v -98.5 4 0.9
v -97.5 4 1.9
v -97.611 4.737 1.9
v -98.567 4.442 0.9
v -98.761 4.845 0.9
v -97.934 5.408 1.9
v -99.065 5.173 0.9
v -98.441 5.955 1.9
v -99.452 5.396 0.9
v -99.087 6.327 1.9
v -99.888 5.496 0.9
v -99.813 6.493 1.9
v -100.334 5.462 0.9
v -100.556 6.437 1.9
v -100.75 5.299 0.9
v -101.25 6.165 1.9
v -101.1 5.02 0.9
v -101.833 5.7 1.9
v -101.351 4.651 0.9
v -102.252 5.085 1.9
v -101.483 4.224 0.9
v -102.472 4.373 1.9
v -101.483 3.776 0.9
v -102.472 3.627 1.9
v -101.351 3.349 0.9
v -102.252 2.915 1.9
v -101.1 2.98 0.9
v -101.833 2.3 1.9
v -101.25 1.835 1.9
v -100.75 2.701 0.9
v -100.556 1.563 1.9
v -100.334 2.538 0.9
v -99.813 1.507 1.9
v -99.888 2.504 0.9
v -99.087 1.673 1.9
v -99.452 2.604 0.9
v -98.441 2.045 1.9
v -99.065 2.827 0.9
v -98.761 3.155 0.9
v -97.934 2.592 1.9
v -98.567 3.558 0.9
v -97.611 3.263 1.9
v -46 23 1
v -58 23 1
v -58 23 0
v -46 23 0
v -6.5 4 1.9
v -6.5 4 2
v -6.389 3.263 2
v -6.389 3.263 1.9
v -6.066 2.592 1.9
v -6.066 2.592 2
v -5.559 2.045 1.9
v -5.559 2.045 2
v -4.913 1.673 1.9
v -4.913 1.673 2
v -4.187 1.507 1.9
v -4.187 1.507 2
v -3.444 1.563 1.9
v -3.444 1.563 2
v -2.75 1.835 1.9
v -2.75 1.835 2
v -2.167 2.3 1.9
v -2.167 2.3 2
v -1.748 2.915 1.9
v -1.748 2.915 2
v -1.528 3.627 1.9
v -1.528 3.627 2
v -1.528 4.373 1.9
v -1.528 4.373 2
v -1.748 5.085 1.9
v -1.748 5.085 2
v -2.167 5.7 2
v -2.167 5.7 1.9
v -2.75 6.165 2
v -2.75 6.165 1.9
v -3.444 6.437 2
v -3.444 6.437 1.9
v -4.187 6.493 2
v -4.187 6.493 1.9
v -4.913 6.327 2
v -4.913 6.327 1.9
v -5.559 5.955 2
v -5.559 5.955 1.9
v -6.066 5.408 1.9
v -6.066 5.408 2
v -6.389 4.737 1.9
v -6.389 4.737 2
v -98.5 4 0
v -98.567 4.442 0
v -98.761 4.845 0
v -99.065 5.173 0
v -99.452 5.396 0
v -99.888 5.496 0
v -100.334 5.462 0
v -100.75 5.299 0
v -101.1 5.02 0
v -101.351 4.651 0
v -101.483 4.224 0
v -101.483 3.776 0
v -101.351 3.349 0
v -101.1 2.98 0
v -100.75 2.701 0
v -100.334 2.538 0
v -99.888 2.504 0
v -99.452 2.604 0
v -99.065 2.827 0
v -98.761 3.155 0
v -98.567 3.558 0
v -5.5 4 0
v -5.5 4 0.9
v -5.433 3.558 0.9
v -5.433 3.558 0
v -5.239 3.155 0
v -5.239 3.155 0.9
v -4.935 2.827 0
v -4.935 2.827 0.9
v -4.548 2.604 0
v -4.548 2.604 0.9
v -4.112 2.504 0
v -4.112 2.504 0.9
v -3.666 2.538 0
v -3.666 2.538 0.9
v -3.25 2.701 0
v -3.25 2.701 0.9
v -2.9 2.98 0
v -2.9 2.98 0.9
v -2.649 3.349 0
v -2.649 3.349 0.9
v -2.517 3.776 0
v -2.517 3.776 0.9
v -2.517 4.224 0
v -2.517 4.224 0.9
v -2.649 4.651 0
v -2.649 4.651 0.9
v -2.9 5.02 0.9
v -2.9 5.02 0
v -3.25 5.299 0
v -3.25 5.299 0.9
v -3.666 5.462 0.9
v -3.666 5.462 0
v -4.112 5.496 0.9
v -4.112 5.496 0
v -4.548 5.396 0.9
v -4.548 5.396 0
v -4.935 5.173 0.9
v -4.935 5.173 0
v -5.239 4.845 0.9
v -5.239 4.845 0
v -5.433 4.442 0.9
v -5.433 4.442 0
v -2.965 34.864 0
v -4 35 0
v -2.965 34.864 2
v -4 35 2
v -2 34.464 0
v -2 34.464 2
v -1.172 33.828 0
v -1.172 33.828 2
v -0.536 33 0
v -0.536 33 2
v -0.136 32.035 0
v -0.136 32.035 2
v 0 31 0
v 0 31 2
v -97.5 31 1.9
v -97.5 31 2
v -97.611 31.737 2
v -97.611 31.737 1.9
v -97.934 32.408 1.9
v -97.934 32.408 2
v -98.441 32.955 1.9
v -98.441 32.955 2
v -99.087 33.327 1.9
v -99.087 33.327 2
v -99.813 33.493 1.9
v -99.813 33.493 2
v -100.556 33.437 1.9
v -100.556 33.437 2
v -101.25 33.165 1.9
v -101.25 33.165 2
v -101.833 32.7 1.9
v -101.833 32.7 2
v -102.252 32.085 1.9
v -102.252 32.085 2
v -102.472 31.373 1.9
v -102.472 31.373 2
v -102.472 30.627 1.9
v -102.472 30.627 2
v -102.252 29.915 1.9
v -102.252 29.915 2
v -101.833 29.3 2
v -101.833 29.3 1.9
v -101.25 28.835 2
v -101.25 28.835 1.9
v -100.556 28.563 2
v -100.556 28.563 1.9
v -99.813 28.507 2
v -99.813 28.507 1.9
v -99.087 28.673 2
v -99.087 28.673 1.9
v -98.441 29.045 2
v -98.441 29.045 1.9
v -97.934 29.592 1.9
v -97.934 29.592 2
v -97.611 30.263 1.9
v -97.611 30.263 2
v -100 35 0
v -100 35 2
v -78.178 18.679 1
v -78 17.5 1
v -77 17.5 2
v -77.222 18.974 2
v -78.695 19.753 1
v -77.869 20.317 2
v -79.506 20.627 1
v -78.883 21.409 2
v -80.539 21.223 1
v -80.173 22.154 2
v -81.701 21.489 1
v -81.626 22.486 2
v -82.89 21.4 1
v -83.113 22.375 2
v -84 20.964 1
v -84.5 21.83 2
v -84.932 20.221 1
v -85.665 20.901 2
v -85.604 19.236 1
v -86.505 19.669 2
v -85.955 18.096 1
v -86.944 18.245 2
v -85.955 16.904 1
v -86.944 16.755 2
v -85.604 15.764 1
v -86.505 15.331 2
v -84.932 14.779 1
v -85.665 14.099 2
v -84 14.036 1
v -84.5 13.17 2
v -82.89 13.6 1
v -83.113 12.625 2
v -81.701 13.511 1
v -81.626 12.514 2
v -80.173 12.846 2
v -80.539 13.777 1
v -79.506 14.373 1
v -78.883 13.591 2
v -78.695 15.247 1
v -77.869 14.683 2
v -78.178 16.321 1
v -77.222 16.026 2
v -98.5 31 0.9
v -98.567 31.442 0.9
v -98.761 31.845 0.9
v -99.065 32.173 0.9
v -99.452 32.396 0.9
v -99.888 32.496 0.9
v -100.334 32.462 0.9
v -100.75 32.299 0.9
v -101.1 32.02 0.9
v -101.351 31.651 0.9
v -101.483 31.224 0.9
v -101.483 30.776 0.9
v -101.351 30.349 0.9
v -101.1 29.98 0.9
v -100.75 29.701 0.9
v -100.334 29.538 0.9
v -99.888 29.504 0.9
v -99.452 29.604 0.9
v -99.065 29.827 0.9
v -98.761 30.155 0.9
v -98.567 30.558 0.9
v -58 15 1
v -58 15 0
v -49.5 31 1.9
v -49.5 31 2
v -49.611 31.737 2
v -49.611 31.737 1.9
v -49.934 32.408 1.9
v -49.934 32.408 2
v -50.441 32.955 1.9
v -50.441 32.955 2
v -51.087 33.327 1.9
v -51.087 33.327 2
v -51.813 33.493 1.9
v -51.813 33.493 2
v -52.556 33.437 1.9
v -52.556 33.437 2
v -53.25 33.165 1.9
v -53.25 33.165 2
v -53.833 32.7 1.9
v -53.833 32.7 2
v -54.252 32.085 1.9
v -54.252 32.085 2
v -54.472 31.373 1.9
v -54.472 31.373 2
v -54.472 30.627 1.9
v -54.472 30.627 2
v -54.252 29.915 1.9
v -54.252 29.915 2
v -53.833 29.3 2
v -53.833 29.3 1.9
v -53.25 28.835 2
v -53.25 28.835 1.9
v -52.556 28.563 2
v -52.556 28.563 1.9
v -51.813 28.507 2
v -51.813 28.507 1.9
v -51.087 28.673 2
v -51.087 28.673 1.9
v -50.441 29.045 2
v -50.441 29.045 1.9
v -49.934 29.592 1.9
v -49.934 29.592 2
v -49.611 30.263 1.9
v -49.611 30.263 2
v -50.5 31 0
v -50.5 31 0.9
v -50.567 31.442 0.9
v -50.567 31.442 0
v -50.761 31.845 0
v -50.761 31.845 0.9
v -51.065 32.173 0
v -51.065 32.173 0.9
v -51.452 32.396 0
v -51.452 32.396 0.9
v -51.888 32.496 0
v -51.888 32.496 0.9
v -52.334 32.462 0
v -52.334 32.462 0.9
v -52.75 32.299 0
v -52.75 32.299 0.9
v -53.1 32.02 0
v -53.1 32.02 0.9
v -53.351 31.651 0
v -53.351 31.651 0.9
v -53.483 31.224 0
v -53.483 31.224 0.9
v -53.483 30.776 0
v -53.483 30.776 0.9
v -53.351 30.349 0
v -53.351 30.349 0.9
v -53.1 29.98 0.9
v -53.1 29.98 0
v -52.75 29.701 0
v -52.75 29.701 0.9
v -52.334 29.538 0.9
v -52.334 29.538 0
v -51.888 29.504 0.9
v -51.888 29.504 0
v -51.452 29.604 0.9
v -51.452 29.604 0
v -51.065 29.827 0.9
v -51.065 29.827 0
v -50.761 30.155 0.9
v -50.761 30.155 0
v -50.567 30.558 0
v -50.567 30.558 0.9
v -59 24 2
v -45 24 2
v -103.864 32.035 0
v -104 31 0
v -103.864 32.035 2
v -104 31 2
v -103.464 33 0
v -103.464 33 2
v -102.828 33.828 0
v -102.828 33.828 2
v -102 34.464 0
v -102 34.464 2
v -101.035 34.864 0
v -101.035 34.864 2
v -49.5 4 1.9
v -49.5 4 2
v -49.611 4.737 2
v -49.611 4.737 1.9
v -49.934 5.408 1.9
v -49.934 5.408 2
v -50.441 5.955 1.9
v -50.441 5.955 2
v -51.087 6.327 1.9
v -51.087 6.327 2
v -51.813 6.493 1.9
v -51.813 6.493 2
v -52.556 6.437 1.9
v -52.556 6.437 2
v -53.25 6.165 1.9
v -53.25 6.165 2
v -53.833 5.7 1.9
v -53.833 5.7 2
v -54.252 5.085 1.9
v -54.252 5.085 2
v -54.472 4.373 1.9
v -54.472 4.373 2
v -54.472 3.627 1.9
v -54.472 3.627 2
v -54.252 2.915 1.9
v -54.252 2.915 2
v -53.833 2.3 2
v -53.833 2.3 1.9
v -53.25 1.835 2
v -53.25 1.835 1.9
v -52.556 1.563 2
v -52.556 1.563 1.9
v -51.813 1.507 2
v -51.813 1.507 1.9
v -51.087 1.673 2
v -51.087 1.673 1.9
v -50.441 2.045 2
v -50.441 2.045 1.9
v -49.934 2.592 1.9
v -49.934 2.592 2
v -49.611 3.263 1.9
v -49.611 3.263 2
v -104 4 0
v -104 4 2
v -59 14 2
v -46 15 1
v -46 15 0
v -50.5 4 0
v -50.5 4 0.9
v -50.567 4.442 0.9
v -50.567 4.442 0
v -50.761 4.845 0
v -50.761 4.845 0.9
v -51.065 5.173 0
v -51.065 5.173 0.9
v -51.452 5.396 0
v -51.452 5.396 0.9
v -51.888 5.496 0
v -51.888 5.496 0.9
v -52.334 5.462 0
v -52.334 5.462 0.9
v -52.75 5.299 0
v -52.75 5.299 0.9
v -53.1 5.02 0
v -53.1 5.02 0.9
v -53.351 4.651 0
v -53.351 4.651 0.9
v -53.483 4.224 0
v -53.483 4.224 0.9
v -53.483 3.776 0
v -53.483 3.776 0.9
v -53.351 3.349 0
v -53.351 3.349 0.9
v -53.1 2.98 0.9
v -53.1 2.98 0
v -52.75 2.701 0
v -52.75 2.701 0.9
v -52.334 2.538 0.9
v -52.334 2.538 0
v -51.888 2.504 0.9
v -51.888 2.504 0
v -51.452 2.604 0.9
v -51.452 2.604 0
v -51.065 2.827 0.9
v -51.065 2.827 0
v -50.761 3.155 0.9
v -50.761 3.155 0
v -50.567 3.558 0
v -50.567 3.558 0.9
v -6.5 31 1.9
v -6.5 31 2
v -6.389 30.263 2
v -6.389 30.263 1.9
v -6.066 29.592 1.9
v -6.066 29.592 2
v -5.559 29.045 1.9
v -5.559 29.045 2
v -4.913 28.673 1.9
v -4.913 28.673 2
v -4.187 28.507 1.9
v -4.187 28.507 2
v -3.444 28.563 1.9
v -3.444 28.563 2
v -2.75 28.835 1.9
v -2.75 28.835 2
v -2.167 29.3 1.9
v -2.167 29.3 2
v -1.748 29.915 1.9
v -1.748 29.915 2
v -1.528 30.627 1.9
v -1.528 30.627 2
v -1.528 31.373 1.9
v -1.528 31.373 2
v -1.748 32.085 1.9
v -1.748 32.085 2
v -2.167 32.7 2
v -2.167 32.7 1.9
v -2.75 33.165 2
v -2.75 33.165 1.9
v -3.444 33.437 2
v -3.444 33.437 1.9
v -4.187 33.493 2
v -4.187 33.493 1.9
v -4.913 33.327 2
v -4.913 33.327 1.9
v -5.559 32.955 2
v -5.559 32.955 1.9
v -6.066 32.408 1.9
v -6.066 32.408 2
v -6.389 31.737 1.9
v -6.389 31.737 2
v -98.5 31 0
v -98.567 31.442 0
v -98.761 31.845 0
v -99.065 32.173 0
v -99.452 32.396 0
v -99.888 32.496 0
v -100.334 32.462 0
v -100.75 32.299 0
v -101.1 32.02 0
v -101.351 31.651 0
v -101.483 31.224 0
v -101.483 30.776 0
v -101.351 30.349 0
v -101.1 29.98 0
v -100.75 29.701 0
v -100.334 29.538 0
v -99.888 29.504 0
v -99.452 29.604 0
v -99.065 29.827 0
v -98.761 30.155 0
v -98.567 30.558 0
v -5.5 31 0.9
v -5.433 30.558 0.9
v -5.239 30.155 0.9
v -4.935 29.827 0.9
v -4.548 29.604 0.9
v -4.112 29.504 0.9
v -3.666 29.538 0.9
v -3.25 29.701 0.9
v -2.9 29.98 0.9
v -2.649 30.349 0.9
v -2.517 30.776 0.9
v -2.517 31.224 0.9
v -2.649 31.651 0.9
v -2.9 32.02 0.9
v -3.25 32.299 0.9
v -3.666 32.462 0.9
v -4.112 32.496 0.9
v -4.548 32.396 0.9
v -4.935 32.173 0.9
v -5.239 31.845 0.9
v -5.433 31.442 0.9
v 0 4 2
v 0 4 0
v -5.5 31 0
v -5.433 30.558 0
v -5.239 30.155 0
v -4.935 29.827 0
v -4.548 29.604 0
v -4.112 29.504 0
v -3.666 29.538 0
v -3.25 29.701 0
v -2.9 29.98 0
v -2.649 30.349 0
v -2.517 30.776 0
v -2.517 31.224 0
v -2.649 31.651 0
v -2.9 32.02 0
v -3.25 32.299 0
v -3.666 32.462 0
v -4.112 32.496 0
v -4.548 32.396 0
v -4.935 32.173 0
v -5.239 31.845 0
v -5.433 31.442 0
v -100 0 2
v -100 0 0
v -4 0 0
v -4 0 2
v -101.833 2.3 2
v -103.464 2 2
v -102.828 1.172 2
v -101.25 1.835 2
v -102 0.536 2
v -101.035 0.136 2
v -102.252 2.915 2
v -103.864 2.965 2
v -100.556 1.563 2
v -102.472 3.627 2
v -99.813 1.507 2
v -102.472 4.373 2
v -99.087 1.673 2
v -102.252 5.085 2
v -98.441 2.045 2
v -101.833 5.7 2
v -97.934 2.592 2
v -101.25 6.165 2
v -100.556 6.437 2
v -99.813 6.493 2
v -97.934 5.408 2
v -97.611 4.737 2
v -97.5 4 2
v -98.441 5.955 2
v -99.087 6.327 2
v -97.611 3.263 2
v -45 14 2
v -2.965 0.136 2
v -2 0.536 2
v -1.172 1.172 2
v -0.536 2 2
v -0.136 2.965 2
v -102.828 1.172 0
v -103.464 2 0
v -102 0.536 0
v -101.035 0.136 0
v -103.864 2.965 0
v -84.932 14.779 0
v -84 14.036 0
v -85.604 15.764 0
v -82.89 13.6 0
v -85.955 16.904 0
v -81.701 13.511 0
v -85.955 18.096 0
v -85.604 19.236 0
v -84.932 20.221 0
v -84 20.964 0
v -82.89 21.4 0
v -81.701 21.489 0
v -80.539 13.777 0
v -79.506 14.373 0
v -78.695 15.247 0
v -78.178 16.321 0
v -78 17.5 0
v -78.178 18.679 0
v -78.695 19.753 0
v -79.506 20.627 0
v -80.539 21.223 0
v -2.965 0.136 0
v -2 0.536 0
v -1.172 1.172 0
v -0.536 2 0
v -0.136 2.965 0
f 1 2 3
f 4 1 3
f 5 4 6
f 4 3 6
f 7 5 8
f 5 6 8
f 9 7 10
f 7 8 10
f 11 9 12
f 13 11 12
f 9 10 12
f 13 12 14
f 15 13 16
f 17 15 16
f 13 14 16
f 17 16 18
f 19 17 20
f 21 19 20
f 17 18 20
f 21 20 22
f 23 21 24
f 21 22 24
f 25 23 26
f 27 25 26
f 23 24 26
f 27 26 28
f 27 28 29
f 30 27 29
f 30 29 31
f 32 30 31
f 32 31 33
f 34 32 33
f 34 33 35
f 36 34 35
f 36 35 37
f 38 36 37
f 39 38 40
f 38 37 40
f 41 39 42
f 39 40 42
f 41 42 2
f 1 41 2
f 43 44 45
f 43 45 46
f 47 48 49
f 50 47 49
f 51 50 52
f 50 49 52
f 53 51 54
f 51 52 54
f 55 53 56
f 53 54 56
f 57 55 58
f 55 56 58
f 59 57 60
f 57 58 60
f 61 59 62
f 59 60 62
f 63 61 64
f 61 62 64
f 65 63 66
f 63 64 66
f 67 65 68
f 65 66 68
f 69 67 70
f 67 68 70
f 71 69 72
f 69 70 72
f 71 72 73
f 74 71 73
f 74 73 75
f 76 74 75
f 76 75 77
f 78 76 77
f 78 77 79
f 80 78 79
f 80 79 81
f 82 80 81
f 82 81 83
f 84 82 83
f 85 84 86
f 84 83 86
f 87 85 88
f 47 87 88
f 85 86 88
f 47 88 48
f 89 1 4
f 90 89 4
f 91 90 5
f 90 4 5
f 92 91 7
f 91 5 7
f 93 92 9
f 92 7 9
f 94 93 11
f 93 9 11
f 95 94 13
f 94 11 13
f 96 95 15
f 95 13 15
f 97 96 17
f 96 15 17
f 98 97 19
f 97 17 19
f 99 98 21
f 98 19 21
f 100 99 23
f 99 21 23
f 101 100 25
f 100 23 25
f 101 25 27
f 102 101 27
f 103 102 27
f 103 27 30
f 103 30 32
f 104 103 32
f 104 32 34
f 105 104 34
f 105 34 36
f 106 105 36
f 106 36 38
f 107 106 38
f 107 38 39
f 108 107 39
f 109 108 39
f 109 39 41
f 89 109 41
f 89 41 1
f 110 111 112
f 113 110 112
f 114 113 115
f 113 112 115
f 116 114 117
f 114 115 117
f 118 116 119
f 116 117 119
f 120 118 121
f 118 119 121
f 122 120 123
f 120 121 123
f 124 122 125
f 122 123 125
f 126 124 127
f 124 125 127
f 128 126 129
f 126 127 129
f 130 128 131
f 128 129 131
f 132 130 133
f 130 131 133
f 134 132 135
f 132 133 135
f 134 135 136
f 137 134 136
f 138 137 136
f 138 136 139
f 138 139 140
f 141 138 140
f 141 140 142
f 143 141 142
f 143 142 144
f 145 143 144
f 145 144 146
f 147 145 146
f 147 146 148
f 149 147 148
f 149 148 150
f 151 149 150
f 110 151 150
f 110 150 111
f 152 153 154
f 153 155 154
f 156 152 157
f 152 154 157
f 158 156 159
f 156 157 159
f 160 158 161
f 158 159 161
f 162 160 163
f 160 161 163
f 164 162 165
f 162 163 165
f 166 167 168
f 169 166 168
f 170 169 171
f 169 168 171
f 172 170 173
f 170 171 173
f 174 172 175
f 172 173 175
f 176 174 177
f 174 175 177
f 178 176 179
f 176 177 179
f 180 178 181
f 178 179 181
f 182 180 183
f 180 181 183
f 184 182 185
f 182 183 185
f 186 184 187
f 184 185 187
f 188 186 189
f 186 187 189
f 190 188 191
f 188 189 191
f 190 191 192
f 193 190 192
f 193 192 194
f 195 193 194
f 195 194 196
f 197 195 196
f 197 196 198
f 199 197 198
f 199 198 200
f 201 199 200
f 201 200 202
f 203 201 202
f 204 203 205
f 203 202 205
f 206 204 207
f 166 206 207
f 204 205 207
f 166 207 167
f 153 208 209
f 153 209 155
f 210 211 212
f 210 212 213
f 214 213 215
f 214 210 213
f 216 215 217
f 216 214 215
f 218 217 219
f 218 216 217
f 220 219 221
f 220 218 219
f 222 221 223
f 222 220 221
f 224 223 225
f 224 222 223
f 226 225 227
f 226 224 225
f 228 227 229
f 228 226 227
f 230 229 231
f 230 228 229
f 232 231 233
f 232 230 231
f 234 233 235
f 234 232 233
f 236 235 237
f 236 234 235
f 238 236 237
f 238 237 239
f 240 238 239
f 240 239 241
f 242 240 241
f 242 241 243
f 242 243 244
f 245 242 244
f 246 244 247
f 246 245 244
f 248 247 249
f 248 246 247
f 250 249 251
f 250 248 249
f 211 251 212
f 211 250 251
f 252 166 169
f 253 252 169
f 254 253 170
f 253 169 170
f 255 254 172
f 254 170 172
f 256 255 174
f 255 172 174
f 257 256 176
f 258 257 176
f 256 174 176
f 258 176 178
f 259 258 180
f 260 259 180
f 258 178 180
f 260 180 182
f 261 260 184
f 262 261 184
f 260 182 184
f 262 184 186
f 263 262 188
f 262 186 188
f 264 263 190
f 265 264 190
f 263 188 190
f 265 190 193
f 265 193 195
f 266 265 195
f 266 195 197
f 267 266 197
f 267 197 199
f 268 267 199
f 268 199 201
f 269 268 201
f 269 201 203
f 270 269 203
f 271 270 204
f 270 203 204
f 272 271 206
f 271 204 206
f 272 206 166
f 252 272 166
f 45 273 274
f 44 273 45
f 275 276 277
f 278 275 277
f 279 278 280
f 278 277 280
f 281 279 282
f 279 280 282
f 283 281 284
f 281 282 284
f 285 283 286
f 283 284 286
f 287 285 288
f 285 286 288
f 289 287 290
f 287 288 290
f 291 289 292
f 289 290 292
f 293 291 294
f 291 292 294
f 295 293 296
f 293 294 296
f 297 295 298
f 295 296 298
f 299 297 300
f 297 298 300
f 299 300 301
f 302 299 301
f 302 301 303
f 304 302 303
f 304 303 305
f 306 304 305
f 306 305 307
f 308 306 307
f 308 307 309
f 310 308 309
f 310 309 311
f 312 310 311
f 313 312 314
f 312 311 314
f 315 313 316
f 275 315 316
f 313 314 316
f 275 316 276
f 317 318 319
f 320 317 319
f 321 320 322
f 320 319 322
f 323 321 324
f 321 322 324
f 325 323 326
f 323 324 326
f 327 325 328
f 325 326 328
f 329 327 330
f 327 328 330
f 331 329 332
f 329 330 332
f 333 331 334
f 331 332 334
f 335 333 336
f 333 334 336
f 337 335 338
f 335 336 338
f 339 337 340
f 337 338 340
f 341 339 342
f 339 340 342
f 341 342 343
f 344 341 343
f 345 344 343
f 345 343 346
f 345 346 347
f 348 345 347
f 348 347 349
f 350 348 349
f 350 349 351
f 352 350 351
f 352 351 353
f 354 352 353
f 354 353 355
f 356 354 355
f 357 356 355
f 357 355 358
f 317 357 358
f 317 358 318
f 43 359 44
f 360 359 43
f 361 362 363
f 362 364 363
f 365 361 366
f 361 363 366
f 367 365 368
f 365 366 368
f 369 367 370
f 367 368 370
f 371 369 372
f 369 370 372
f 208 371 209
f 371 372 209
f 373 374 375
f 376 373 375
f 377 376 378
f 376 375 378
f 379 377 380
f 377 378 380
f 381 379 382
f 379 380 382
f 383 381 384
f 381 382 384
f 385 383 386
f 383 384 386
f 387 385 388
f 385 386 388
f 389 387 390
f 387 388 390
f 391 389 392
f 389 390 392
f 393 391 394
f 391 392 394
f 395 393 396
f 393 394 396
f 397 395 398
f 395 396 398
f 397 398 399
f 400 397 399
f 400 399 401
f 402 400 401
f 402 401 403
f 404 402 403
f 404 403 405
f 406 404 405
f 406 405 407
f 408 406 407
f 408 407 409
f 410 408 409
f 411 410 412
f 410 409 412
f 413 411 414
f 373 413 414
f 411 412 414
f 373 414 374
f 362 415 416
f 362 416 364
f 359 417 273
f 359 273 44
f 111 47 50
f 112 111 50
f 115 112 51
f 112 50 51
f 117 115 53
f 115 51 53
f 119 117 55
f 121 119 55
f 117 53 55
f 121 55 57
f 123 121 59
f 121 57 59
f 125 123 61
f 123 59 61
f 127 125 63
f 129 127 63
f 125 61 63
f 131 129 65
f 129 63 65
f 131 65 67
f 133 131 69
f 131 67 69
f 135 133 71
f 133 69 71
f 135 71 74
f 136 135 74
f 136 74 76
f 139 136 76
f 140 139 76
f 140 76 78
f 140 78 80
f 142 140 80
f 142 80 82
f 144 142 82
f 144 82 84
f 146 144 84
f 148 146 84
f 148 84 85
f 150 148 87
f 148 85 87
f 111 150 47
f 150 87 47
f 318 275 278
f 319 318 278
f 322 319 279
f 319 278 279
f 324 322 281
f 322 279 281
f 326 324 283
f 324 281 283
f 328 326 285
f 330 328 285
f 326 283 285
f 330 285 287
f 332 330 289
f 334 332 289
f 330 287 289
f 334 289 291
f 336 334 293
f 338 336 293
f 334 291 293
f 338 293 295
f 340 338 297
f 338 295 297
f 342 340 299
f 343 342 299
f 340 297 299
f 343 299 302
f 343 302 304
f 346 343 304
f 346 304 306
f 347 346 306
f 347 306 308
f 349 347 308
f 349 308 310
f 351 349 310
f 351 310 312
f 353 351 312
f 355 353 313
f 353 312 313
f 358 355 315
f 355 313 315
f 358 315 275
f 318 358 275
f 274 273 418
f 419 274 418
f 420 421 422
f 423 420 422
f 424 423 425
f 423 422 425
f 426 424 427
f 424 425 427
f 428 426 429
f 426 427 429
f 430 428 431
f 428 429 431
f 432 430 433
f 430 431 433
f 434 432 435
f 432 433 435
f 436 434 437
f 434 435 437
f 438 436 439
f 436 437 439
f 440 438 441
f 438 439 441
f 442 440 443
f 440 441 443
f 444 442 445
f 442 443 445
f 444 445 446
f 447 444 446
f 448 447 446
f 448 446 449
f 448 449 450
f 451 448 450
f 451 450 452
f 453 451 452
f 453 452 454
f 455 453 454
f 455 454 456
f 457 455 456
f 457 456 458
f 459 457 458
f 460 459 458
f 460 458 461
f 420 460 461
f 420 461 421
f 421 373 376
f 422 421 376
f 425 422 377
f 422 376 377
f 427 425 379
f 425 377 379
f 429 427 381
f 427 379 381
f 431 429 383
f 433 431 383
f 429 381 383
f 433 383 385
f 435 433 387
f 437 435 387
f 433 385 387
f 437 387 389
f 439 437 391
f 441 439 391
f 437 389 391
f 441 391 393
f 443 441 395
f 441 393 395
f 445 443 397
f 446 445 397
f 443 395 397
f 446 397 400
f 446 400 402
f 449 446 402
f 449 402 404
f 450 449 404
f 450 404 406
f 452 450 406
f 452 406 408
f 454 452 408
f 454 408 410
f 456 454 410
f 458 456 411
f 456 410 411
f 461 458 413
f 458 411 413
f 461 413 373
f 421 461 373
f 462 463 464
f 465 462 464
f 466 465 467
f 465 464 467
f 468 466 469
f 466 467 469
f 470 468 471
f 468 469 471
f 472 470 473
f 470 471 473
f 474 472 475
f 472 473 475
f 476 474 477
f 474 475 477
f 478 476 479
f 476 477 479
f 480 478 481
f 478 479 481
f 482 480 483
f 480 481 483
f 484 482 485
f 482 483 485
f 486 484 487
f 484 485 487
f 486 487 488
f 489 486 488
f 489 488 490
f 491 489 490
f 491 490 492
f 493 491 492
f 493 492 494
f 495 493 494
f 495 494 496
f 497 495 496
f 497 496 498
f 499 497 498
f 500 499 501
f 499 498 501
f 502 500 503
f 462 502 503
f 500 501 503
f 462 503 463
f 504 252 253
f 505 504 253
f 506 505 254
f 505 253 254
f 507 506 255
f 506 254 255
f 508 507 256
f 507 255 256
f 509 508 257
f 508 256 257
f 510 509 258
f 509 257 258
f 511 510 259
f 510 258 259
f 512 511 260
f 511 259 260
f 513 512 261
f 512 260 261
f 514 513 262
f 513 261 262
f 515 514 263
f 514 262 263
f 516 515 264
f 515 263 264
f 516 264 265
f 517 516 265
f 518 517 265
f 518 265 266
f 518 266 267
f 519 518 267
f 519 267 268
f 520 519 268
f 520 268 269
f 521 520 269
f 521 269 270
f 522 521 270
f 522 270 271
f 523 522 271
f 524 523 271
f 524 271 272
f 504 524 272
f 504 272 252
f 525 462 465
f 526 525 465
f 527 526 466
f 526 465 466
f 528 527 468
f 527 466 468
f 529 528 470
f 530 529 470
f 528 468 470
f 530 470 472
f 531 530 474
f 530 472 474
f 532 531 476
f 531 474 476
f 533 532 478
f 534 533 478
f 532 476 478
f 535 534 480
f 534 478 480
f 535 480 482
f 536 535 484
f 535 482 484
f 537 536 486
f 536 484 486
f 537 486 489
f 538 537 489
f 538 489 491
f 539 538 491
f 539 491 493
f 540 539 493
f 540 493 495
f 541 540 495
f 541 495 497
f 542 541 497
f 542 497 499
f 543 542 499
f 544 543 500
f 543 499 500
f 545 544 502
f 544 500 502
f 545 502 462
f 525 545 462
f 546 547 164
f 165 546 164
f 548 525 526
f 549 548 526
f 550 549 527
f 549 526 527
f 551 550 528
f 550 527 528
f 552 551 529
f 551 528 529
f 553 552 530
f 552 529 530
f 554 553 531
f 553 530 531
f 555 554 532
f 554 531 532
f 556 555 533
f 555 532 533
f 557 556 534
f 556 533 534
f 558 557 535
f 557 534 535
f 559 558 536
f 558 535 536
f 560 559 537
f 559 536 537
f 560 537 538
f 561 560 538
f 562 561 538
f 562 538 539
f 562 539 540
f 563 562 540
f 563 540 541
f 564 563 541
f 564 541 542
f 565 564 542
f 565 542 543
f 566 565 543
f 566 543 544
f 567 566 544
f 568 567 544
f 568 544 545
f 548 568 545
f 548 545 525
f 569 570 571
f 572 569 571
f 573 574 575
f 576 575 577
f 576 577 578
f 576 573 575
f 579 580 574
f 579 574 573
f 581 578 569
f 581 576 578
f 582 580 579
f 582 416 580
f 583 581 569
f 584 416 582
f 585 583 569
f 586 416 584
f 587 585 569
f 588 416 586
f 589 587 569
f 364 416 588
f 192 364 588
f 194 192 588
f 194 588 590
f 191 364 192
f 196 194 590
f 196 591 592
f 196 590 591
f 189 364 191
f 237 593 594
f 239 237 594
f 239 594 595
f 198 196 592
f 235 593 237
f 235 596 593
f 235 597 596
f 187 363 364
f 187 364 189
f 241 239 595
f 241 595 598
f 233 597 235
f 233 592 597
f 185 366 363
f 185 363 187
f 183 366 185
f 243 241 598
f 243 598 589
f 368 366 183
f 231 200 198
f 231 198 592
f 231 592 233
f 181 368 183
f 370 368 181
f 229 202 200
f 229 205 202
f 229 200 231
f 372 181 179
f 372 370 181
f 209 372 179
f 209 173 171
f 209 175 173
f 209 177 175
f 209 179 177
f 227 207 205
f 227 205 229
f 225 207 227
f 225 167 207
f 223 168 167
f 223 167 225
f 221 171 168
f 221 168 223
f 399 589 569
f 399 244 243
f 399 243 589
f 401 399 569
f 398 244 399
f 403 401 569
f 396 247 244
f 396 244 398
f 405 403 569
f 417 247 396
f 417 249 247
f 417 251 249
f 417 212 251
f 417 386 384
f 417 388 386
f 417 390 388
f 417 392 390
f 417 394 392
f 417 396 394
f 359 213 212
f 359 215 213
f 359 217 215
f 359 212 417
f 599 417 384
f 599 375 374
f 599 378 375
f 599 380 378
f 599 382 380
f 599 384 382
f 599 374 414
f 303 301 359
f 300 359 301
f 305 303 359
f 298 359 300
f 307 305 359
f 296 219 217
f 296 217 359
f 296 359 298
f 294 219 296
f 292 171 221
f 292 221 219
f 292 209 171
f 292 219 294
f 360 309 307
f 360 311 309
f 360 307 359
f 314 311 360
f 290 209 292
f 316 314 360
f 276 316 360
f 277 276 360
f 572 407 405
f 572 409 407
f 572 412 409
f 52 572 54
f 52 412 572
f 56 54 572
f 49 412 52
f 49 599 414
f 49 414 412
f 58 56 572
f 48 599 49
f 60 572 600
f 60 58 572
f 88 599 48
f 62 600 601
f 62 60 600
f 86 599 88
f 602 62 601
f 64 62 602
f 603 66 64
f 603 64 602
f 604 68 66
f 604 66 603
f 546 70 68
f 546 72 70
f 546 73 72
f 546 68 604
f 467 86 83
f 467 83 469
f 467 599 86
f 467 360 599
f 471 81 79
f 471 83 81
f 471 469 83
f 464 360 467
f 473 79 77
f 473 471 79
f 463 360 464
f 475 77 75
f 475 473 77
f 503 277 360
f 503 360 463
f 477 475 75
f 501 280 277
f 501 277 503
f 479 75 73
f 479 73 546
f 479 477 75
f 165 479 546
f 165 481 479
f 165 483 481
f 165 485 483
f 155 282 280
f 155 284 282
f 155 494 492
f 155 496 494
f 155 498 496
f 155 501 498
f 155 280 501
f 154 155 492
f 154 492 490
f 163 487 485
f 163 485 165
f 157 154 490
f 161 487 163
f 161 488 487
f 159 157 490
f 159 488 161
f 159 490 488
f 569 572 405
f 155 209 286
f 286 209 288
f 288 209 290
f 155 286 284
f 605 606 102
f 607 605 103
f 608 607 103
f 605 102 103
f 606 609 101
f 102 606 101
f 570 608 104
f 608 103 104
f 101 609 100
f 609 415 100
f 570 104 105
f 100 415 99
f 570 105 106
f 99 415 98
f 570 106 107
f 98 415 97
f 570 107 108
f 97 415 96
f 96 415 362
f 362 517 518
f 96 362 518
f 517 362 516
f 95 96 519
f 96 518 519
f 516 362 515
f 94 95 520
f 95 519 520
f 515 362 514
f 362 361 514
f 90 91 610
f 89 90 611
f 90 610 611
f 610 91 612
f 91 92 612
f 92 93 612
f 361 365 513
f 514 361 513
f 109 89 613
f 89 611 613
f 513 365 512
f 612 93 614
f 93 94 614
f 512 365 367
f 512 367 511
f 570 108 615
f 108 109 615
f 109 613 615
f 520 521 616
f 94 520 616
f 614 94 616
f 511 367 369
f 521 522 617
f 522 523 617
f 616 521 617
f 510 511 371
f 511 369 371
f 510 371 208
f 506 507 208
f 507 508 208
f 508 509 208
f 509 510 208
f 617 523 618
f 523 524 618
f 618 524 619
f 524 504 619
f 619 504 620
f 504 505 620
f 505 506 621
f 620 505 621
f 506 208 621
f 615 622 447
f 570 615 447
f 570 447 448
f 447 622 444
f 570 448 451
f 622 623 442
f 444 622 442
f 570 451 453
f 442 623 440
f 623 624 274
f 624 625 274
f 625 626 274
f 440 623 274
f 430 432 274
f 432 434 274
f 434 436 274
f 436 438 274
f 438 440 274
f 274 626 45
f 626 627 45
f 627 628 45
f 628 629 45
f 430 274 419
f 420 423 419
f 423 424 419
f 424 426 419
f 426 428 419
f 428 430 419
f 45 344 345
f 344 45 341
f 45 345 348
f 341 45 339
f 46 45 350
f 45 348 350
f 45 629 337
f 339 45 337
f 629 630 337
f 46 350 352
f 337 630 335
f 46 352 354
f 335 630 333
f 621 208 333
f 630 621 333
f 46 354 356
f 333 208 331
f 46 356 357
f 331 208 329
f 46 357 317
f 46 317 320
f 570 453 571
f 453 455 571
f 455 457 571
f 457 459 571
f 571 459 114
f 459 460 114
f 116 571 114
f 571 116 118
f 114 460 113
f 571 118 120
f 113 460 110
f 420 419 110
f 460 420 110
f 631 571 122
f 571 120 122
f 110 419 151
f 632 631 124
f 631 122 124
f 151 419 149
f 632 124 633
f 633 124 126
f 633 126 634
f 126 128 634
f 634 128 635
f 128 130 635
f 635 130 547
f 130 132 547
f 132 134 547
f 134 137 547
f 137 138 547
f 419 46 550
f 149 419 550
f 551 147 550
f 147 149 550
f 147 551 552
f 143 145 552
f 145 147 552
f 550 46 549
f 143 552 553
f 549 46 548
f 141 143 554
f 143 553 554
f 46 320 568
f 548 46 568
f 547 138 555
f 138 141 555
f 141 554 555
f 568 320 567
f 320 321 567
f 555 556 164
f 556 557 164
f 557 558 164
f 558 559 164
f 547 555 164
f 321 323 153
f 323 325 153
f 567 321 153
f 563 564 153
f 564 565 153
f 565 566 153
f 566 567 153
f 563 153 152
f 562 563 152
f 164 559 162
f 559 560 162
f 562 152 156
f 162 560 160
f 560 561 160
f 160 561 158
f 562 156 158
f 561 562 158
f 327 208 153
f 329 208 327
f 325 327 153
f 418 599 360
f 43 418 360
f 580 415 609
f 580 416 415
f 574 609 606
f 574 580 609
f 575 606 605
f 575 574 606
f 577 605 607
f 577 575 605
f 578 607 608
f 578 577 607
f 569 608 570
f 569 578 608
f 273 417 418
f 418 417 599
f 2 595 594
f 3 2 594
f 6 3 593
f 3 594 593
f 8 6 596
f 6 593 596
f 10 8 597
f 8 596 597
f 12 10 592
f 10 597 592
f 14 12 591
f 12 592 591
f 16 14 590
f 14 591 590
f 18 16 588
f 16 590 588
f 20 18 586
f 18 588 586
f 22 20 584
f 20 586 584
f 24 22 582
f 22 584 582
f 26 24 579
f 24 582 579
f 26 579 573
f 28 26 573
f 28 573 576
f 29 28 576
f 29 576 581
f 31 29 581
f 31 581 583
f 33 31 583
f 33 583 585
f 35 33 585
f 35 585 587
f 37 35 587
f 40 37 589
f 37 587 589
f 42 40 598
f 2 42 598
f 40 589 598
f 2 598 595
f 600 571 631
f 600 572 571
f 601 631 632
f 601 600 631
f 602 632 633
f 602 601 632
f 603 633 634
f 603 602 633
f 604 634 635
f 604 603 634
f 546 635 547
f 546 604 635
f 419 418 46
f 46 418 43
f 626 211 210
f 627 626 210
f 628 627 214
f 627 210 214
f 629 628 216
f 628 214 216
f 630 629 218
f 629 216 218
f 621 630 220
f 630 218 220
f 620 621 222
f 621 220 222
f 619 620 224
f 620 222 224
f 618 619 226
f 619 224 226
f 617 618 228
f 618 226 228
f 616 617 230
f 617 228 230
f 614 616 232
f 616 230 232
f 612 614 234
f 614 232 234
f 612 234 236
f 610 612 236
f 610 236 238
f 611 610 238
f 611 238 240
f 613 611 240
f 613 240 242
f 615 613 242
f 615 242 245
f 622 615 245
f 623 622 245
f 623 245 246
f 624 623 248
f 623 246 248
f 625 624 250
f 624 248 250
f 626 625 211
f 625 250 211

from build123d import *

# Parameters (mm, degrees)
IZIM1_W                     = 104
IZIM1_H                     = 35
Y_KSEKLIK_EKSTR_ZYON1_DEPTH = 2
IZIM2_R                     = 1.5
KES_EKSTR_ZYON1_DEPTH       = 2
IZIM3_R                     = 2.5
KES_EKSTR_ZYON2_DEPTH       = 0.1
PAH2_SIZE                   = 1
IZIM4_R                     = 1.5
KES_EKSTR_ZYON3_DEPTH       = 2
IZIM5_R                     = 2.5
KES_EKSTR_ZYON4_DEPTH       = 0.1
PAH3_SIZE                   = 1
RADYUS1_R                   = 4
IZIM6_R                     = 4
IZIM6_W                     = 12
IZIM6_H                     = 8
KES_EKSTR_ZYON5_DEPTH       = 2
PAH4_SIZE                   = 1
PAH5_SIZE                   = 1


with BuildPart() as part:
    # Çizim1 → Yükseklik-Ekstrüzyon1 (new body)
    with BuildSketch(Plane.XY):
        with Locations((-52, 17.5)):
            Rectangle(IZIM1_W, IZIM1_H)
    extrude(amount=Y_KSEKLIK_EKSTR_ZYON1_DEPTH)

    # Çizim2 → Kes-Ekstrüzyon1 (cut)
    with BuildSketch(Plane.XY.offset(2)):
        with Locations((-100, 31)):
            Circle(IZIM2_R)
        with Locations((-100, 4)):
            Circle(IZIM2_R)
        with Locations(Location((-4, 4, 0), (0, 0, 180))):
            Circle(IZIM2_R)
        with Locations(Location((-4, 31, 0), (0, 0, 180))):
            Circle(IZIM2_R)
    extrude(amount=-KES_EKSTR_ZYON1_DEPTH, mode=Mode.SUBTRACT)

    # Çizim3 → Kes-Ekstrüzyon2 (cut)
    with BuildSketch(Plane.XY.offset(2)):
        with Locations((-100, 31)):
            Circle(IZIM3_R)
        with Locations((-100, 4)):
            Circle(IZIM3_R)
        with Locations(Location((-4, 4, 0), (0, 0, 180))):
            Circle(IZIM3_R)
        with Locations(Location((-4, 31, 0), (0, 0, 180))):
            Circle(IZIM3_R)
    extrude(amount=-KES_EKSTR_ZYON2_DEPTH, mode=Mode.SUBTRACT)

    # Pah2
    pah2_edges = [part.edges().sort_by_distance(p)[0] for p in [
        (-2.5, 31, 1.9),
        (-2.5, 4, 1.9),
        (-101.5, 4, 1.9),
        (-101.5, 31, 1.9),
    ]]
    chamfer(pah2_edges, length=PAH2_SIZE - 0.0001)  # a hair under: the kernel refuses the full size

    # Çizim4 → Kes-Ekstrüzyon3 (cut)
    with BuildSketch(Plane.XY.offset(2)):
        with Locations((-52, 31)):
            Circle(IZIM4_R)
        with Locations((-52, 4)):
            Circle(IZIM4_R)
    extrude(amount=-KES_EKSTR_ZYON3_DEPTH, mode=Mode.SUBTRACT)

    # Çizim5 → Kes-Ekstrüzyon4 (cut)
    with BuildSketch(Plane.XY.offset(2)):
        with Locations((-52, 31)):
            Circle(IZIM5_R)
        with Locations((-52, 4)):
            Circle(IZIM5_R)
    extrude(amount=-KES_EKSTR_ZYON4_DEPTH, mode=Mode.SUBTRACT)

    # Pah3
    pah3_edges = [part.edges().sort_by_distance(p)[0] for p in [
        (-53.5, 31, 1.9),
        (-53.5, 4, 1.9),
    ]]
    chamfer(pah3_edges, length=PAH3_SIZE - 0.0001)  # a hair under: the kernel refuses the full size

    # Radyus1
    radyus1_edges = [part.edges().sort_by_distance(p)[0] for p in [
        (0, 0, 1),
        (-104, 0, 1),
        (-104, 35, 1),
        (0, 35, 1),
    ]]
    fillet(radyus1_edges, radius=RADYUS1_R)

    # Çizim6 → Kes-Ekstrüzyon5 (cut)
    with BuildSketch(Plane.XY.offset(2)):
        with Locations((-82, 17.5)):
            Circle(IZIM6_R)
        with Locations((-52, 19)):
            Rectangle(IZIM6_W, IZIM6_H)
    extrude(amount=-KES_EKSTR_ZYON5_DEPTH, mode=Mode.SUBTRACT)

    # Pah4
    pah4_edges = [part.edges().sort_by_distance(p)[0] for p in [
        (-58, 19, 2),
        (-52, 15, 2),
        (-46, 19, 2),
        (-52, 23, 2),
    ]]
    chamfer(pah4_edges, length=PAH4_SIZE)

    # Pah5
    pah5_edges = [part.edges().sort_by_distance(p)[0] for p in [
        (-86, 17.5, 2),
    ]]
    chamfer(pah5_edges, length=PAH5_SIZE)


solid = part.part
